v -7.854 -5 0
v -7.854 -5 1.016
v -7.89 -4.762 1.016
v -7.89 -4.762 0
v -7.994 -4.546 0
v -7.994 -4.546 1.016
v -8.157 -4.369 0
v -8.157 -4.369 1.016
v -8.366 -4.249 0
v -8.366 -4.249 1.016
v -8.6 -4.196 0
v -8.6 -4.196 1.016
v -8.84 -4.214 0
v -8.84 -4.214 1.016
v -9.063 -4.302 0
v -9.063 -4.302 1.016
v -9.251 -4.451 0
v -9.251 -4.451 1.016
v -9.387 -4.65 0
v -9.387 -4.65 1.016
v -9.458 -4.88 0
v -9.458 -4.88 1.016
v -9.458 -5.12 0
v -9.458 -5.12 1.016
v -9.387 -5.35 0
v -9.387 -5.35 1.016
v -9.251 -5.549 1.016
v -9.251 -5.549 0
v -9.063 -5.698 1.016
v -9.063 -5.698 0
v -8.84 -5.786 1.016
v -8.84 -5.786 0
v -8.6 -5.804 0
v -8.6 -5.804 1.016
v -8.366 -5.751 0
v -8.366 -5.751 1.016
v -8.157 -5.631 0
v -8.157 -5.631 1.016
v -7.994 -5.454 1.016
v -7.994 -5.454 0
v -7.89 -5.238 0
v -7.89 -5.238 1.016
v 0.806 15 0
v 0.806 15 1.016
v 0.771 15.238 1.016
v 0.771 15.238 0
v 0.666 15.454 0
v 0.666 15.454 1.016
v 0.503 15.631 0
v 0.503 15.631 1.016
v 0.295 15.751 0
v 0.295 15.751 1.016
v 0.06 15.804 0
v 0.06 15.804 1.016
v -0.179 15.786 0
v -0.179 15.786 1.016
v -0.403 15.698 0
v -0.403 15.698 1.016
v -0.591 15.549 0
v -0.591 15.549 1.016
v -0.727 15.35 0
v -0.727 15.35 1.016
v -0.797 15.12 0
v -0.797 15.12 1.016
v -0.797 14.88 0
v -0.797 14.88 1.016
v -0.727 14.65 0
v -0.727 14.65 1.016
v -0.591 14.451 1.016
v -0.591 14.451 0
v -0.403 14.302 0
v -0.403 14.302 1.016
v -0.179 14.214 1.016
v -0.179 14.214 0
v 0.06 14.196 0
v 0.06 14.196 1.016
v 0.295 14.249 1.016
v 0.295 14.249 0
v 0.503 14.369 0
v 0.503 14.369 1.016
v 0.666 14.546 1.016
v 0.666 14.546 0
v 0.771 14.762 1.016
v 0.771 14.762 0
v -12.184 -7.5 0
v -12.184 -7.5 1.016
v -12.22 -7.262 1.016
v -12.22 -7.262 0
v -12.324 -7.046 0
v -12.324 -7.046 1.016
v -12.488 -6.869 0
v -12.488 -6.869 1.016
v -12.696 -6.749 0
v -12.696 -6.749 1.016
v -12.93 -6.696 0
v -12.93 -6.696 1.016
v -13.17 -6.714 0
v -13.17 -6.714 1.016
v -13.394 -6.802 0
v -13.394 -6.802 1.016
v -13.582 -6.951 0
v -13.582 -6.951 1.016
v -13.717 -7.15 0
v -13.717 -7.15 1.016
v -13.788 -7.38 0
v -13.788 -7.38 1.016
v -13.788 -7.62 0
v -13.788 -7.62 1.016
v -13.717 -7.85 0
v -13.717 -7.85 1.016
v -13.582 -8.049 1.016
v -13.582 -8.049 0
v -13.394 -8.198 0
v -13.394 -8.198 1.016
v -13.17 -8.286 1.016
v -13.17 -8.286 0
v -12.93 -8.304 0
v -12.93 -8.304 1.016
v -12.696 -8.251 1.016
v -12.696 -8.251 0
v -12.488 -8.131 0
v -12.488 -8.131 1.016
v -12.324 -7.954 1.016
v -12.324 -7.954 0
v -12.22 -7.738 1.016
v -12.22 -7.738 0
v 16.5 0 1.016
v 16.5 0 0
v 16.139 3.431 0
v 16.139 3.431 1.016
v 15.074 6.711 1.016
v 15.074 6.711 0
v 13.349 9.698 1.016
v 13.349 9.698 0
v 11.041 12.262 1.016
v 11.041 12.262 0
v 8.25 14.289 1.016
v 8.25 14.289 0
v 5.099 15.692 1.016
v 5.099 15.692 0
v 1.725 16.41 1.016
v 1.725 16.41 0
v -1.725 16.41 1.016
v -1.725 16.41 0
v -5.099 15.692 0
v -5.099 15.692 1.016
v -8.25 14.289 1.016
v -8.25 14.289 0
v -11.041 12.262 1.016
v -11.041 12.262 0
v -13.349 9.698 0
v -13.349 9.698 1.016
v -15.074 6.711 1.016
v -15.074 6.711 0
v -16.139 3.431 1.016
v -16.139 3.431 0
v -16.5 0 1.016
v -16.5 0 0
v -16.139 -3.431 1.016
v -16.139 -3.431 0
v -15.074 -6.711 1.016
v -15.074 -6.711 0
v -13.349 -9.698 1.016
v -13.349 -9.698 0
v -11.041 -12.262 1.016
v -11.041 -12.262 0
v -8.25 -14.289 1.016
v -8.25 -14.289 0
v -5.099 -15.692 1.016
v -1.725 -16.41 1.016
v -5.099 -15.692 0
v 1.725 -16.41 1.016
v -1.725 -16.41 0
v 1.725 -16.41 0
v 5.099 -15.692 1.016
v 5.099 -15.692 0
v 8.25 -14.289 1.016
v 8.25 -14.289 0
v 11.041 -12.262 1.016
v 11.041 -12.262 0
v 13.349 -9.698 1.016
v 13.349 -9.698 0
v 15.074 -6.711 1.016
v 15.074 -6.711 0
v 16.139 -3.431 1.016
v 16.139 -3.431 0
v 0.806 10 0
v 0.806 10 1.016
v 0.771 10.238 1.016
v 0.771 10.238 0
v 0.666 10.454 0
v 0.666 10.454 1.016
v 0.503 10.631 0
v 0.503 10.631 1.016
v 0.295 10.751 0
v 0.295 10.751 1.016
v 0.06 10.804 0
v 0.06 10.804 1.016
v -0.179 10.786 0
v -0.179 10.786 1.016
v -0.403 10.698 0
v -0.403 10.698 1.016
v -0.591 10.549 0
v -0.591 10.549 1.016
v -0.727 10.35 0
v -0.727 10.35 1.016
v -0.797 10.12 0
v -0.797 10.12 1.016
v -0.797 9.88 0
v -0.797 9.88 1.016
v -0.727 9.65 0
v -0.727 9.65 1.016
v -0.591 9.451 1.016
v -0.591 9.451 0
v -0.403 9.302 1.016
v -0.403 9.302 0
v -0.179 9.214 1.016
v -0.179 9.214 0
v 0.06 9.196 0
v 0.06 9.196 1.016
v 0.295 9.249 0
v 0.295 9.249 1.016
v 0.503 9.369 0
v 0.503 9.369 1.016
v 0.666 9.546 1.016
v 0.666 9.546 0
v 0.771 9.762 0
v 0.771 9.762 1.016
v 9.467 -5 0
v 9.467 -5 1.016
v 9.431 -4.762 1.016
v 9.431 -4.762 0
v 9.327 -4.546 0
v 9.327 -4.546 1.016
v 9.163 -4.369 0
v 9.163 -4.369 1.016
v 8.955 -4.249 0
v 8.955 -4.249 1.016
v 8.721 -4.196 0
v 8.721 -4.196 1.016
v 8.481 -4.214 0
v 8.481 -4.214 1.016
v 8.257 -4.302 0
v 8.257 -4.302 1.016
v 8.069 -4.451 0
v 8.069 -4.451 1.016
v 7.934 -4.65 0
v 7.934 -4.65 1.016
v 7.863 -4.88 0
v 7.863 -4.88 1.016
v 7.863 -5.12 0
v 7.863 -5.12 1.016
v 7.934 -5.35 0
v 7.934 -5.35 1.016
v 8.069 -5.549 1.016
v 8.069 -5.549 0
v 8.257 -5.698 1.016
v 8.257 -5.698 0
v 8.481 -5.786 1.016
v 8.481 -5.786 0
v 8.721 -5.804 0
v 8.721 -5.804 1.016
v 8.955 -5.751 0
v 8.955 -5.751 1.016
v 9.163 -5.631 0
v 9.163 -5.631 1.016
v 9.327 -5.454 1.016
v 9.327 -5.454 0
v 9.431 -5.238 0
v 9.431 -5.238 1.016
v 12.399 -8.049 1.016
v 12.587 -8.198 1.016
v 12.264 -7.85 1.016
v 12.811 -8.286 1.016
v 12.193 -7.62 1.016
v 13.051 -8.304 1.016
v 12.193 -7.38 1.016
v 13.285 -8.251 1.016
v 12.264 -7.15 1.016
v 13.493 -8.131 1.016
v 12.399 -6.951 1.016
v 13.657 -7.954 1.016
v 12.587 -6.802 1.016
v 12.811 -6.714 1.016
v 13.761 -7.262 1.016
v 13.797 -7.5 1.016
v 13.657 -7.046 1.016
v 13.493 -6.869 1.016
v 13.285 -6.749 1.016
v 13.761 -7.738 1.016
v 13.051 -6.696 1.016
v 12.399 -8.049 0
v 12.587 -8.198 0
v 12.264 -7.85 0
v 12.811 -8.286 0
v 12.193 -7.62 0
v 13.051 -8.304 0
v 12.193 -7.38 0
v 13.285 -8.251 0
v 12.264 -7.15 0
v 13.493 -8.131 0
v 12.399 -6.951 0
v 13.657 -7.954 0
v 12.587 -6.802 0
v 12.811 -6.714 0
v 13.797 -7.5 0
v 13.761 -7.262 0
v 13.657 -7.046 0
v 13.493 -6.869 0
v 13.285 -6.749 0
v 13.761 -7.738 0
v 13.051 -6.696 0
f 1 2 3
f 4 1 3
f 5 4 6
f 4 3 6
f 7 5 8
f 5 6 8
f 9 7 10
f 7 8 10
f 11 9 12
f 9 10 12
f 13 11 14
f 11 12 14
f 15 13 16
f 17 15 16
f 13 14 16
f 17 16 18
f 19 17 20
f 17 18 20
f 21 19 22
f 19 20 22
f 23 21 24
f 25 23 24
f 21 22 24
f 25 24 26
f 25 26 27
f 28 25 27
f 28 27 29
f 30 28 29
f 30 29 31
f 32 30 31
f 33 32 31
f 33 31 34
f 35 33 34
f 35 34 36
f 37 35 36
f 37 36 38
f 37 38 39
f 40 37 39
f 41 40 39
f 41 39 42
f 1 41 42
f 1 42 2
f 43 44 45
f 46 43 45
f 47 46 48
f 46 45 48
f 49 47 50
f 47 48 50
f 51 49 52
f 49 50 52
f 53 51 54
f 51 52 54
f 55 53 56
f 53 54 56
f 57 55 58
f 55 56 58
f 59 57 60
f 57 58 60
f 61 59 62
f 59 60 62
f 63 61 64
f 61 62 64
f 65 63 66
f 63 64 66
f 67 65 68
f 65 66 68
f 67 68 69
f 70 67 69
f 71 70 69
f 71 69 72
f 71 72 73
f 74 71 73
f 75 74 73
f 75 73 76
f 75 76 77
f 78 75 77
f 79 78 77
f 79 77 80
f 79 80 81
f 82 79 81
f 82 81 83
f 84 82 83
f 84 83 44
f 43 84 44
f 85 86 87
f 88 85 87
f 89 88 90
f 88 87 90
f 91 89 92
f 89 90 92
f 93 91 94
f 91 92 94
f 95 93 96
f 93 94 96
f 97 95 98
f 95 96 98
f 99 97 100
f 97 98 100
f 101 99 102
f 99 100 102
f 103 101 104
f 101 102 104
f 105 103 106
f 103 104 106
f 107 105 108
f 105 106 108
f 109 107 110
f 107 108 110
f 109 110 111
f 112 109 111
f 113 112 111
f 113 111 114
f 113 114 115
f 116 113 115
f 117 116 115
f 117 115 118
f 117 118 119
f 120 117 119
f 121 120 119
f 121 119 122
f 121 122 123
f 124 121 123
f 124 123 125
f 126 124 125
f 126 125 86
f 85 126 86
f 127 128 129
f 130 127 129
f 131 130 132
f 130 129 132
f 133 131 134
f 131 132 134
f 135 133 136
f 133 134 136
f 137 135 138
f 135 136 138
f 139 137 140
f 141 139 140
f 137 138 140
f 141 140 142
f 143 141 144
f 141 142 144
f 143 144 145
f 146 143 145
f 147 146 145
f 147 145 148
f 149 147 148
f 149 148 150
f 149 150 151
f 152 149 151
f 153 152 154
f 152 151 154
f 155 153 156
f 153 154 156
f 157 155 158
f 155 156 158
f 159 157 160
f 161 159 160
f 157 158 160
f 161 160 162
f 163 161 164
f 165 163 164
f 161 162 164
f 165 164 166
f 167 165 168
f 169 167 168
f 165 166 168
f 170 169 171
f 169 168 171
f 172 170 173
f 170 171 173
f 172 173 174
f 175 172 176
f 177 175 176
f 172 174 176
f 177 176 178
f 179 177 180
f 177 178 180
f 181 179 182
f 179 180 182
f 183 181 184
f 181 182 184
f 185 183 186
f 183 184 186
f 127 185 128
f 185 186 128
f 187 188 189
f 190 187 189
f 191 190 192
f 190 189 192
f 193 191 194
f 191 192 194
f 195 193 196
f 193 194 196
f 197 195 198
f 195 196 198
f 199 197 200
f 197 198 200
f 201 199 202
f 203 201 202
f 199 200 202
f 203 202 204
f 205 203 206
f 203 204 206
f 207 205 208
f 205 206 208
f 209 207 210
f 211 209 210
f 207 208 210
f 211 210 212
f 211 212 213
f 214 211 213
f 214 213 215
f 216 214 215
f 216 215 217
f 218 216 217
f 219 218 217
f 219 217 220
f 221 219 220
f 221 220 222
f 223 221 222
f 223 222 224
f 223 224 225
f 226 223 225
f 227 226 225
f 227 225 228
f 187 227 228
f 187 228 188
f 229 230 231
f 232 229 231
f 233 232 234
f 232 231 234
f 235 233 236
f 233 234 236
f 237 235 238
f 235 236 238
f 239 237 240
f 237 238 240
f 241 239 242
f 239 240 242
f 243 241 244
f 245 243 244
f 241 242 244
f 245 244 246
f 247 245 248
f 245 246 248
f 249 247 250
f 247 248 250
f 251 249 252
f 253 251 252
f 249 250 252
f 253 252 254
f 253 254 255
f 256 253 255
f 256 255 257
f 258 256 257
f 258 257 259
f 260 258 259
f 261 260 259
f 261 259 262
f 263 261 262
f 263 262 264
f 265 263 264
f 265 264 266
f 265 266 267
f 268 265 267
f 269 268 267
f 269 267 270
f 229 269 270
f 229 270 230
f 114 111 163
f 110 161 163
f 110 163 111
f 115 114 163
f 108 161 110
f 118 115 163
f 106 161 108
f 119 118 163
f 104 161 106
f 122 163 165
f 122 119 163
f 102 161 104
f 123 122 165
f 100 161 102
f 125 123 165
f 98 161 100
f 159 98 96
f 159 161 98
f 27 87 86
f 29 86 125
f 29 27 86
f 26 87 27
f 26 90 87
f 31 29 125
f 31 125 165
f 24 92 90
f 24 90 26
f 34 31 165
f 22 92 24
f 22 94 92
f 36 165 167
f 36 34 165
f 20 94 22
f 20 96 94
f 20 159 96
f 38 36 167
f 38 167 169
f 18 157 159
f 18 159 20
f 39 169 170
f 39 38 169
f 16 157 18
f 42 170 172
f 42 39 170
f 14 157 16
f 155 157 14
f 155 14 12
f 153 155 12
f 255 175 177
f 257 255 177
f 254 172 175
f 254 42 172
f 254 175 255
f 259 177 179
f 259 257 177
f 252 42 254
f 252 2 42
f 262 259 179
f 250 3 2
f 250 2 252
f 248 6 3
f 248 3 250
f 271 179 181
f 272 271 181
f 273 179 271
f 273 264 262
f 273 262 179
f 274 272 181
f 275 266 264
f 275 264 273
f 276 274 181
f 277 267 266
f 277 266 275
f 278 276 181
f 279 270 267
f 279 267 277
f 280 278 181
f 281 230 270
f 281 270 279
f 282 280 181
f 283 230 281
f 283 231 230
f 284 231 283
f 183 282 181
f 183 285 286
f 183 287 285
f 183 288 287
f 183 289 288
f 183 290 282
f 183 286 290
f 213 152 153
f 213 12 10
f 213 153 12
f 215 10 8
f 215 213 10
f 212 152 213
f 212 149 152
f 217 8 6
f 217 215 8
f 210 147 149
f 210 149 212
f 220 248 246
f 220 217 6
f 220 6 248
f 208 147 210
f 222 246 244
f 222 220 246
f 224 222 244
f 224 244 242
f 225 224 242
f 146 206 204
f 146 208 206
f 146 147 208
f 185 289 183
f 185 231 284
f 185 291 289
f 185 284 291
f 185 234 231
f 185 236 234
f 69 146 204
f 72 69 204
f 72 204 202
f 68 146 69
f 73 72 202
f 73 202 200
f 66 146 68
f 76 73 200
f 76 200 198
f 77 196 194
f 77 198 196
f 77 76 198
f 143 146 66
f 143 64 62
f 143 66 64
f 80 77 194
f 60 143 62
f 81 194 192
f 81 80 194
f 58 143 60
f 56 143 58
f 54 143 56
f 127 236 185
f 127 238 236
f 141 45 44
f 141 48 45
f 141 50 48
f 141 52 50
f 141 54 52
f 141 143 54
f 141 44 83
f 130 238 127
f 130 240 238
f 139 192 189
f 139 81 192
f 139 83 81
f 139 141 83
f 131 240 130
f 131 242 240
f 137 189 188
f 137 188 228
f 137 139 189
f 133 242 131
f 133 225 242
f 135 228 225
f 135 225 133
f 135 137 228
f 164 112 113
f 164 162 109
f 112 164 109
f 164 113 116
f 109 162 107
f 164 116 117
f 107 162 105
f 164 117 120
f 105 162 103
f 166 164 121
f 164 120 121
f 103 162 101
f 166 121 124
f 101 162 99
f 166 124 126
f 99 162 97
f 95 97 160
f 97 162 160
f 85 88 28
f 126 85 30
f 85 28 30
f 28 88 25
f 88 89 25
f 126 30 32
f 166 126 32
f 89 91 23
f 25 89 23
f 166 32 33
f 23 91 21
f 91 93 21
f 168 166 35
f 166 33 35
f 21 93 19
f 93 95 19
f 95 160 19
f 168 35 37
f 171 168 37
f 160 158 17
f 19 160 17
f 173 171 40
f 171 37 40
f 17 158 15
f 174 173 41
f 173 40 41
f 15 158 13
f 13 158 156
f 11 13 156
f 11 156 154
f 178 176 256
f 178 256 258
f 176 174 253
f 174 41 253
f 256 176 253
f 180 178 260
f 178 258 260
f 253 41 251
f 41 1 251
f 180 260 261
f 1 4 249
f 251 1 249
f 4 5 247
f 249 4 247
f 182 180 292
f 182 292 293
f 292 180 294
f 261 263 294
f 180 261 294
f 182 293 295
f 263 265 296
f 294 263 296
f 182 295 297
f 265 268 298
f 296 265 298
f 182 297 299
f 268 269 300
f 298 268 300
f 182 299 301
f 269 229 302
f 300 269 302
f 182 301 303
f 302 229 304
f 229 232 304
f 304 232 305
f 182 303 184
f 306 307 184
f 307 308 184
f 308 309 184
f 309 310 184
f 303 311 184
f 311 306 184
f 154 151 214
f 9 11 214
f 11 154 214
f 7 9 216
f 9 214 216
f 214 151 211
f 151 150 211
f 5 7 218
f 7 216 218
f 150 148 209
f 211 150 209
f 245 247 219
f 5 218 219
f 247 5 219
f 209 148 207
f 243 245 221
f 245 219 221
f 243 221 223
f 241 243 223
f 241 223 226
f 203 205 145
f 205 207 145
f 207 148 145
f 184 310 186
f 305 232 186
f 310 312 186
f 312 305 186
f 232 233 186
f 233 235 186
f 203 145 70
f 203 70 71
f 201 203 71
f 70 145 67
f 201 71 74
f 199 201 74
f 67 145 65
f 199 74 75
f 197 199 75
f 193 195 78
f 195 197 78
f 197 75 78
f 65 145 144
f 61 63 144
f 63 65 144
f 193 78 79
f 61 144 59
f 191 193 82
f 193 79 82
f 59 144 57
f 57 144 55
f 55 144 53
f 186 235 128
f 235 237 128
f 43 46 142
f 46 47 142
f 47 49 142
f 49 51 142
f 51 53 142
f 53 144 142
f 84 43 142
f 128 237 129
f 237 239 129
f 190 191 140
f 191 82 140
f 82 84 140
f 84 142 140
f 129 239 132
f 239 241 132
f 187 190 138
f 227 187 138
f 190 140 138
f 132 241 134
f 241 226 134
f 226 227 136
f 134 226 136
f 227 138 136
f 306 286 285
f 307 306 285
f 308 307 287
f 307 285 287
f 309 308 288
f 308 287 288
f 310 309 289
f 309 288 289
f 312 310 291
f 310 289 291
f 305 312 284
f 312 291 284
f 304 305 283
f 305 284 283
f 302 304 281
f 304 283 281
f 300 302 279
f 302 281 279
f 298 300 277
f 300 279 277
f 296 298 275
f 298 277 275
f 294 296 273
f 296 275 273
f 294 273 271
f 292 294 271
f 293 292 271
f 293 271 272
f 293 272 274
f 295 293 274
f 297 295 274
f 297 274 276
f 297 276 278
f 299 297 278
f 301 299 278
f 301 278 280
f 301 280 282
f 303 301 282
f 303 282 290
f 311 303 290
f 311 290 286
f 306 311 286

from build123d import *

# Parameters (mm, degrees)
SKETCH1_R             = 16.5
EXTRUDE1_DEPTH        = 1.016
F_0_CLEARANCE_HOLE1_D = 1.6129
SKETCH6_R             = 0.80645
CUT_EXTRUDE1_DEPTH    = 5


with BuildPart() as part:
    # Sketch1 → Extrude1 (new body)
    with BuildSketch(Plane.XY):
        Circle(SKETCH1_R)
    extrude(amount=EXTRUDE1_DEPTH)

    # #0 Clearance Hole1 (through all)
    with Locations(Plane(origin=(0, 10, 0), x_dir=(-1, 0, 0), z_dir=(0, 0, -1))):
        with Locations((0, 0), (8.660254038, -15), (-8.660254038, -15)):
            Hole(F_0_CLEARANCE_HOLE1_D / 2)

    # Sketch6 → Cut-Extrude1 (cut)
    with BuildSketch(Plane.XY.offset(1.016)):
        with Locations((0, 15)):
            Circle(SKETCH6_R)
        with Locations((12.990381057, -7.5)):
            Circle(SKETCH6_R)
        with Locations((-12.990381057, -7.5)):
            Circle(SKETCH6_R)
    extrude(amount=-CUT_EXTRUDE1_DEPTH, mode=Mode.SUBTRACT)


solid = part.part
